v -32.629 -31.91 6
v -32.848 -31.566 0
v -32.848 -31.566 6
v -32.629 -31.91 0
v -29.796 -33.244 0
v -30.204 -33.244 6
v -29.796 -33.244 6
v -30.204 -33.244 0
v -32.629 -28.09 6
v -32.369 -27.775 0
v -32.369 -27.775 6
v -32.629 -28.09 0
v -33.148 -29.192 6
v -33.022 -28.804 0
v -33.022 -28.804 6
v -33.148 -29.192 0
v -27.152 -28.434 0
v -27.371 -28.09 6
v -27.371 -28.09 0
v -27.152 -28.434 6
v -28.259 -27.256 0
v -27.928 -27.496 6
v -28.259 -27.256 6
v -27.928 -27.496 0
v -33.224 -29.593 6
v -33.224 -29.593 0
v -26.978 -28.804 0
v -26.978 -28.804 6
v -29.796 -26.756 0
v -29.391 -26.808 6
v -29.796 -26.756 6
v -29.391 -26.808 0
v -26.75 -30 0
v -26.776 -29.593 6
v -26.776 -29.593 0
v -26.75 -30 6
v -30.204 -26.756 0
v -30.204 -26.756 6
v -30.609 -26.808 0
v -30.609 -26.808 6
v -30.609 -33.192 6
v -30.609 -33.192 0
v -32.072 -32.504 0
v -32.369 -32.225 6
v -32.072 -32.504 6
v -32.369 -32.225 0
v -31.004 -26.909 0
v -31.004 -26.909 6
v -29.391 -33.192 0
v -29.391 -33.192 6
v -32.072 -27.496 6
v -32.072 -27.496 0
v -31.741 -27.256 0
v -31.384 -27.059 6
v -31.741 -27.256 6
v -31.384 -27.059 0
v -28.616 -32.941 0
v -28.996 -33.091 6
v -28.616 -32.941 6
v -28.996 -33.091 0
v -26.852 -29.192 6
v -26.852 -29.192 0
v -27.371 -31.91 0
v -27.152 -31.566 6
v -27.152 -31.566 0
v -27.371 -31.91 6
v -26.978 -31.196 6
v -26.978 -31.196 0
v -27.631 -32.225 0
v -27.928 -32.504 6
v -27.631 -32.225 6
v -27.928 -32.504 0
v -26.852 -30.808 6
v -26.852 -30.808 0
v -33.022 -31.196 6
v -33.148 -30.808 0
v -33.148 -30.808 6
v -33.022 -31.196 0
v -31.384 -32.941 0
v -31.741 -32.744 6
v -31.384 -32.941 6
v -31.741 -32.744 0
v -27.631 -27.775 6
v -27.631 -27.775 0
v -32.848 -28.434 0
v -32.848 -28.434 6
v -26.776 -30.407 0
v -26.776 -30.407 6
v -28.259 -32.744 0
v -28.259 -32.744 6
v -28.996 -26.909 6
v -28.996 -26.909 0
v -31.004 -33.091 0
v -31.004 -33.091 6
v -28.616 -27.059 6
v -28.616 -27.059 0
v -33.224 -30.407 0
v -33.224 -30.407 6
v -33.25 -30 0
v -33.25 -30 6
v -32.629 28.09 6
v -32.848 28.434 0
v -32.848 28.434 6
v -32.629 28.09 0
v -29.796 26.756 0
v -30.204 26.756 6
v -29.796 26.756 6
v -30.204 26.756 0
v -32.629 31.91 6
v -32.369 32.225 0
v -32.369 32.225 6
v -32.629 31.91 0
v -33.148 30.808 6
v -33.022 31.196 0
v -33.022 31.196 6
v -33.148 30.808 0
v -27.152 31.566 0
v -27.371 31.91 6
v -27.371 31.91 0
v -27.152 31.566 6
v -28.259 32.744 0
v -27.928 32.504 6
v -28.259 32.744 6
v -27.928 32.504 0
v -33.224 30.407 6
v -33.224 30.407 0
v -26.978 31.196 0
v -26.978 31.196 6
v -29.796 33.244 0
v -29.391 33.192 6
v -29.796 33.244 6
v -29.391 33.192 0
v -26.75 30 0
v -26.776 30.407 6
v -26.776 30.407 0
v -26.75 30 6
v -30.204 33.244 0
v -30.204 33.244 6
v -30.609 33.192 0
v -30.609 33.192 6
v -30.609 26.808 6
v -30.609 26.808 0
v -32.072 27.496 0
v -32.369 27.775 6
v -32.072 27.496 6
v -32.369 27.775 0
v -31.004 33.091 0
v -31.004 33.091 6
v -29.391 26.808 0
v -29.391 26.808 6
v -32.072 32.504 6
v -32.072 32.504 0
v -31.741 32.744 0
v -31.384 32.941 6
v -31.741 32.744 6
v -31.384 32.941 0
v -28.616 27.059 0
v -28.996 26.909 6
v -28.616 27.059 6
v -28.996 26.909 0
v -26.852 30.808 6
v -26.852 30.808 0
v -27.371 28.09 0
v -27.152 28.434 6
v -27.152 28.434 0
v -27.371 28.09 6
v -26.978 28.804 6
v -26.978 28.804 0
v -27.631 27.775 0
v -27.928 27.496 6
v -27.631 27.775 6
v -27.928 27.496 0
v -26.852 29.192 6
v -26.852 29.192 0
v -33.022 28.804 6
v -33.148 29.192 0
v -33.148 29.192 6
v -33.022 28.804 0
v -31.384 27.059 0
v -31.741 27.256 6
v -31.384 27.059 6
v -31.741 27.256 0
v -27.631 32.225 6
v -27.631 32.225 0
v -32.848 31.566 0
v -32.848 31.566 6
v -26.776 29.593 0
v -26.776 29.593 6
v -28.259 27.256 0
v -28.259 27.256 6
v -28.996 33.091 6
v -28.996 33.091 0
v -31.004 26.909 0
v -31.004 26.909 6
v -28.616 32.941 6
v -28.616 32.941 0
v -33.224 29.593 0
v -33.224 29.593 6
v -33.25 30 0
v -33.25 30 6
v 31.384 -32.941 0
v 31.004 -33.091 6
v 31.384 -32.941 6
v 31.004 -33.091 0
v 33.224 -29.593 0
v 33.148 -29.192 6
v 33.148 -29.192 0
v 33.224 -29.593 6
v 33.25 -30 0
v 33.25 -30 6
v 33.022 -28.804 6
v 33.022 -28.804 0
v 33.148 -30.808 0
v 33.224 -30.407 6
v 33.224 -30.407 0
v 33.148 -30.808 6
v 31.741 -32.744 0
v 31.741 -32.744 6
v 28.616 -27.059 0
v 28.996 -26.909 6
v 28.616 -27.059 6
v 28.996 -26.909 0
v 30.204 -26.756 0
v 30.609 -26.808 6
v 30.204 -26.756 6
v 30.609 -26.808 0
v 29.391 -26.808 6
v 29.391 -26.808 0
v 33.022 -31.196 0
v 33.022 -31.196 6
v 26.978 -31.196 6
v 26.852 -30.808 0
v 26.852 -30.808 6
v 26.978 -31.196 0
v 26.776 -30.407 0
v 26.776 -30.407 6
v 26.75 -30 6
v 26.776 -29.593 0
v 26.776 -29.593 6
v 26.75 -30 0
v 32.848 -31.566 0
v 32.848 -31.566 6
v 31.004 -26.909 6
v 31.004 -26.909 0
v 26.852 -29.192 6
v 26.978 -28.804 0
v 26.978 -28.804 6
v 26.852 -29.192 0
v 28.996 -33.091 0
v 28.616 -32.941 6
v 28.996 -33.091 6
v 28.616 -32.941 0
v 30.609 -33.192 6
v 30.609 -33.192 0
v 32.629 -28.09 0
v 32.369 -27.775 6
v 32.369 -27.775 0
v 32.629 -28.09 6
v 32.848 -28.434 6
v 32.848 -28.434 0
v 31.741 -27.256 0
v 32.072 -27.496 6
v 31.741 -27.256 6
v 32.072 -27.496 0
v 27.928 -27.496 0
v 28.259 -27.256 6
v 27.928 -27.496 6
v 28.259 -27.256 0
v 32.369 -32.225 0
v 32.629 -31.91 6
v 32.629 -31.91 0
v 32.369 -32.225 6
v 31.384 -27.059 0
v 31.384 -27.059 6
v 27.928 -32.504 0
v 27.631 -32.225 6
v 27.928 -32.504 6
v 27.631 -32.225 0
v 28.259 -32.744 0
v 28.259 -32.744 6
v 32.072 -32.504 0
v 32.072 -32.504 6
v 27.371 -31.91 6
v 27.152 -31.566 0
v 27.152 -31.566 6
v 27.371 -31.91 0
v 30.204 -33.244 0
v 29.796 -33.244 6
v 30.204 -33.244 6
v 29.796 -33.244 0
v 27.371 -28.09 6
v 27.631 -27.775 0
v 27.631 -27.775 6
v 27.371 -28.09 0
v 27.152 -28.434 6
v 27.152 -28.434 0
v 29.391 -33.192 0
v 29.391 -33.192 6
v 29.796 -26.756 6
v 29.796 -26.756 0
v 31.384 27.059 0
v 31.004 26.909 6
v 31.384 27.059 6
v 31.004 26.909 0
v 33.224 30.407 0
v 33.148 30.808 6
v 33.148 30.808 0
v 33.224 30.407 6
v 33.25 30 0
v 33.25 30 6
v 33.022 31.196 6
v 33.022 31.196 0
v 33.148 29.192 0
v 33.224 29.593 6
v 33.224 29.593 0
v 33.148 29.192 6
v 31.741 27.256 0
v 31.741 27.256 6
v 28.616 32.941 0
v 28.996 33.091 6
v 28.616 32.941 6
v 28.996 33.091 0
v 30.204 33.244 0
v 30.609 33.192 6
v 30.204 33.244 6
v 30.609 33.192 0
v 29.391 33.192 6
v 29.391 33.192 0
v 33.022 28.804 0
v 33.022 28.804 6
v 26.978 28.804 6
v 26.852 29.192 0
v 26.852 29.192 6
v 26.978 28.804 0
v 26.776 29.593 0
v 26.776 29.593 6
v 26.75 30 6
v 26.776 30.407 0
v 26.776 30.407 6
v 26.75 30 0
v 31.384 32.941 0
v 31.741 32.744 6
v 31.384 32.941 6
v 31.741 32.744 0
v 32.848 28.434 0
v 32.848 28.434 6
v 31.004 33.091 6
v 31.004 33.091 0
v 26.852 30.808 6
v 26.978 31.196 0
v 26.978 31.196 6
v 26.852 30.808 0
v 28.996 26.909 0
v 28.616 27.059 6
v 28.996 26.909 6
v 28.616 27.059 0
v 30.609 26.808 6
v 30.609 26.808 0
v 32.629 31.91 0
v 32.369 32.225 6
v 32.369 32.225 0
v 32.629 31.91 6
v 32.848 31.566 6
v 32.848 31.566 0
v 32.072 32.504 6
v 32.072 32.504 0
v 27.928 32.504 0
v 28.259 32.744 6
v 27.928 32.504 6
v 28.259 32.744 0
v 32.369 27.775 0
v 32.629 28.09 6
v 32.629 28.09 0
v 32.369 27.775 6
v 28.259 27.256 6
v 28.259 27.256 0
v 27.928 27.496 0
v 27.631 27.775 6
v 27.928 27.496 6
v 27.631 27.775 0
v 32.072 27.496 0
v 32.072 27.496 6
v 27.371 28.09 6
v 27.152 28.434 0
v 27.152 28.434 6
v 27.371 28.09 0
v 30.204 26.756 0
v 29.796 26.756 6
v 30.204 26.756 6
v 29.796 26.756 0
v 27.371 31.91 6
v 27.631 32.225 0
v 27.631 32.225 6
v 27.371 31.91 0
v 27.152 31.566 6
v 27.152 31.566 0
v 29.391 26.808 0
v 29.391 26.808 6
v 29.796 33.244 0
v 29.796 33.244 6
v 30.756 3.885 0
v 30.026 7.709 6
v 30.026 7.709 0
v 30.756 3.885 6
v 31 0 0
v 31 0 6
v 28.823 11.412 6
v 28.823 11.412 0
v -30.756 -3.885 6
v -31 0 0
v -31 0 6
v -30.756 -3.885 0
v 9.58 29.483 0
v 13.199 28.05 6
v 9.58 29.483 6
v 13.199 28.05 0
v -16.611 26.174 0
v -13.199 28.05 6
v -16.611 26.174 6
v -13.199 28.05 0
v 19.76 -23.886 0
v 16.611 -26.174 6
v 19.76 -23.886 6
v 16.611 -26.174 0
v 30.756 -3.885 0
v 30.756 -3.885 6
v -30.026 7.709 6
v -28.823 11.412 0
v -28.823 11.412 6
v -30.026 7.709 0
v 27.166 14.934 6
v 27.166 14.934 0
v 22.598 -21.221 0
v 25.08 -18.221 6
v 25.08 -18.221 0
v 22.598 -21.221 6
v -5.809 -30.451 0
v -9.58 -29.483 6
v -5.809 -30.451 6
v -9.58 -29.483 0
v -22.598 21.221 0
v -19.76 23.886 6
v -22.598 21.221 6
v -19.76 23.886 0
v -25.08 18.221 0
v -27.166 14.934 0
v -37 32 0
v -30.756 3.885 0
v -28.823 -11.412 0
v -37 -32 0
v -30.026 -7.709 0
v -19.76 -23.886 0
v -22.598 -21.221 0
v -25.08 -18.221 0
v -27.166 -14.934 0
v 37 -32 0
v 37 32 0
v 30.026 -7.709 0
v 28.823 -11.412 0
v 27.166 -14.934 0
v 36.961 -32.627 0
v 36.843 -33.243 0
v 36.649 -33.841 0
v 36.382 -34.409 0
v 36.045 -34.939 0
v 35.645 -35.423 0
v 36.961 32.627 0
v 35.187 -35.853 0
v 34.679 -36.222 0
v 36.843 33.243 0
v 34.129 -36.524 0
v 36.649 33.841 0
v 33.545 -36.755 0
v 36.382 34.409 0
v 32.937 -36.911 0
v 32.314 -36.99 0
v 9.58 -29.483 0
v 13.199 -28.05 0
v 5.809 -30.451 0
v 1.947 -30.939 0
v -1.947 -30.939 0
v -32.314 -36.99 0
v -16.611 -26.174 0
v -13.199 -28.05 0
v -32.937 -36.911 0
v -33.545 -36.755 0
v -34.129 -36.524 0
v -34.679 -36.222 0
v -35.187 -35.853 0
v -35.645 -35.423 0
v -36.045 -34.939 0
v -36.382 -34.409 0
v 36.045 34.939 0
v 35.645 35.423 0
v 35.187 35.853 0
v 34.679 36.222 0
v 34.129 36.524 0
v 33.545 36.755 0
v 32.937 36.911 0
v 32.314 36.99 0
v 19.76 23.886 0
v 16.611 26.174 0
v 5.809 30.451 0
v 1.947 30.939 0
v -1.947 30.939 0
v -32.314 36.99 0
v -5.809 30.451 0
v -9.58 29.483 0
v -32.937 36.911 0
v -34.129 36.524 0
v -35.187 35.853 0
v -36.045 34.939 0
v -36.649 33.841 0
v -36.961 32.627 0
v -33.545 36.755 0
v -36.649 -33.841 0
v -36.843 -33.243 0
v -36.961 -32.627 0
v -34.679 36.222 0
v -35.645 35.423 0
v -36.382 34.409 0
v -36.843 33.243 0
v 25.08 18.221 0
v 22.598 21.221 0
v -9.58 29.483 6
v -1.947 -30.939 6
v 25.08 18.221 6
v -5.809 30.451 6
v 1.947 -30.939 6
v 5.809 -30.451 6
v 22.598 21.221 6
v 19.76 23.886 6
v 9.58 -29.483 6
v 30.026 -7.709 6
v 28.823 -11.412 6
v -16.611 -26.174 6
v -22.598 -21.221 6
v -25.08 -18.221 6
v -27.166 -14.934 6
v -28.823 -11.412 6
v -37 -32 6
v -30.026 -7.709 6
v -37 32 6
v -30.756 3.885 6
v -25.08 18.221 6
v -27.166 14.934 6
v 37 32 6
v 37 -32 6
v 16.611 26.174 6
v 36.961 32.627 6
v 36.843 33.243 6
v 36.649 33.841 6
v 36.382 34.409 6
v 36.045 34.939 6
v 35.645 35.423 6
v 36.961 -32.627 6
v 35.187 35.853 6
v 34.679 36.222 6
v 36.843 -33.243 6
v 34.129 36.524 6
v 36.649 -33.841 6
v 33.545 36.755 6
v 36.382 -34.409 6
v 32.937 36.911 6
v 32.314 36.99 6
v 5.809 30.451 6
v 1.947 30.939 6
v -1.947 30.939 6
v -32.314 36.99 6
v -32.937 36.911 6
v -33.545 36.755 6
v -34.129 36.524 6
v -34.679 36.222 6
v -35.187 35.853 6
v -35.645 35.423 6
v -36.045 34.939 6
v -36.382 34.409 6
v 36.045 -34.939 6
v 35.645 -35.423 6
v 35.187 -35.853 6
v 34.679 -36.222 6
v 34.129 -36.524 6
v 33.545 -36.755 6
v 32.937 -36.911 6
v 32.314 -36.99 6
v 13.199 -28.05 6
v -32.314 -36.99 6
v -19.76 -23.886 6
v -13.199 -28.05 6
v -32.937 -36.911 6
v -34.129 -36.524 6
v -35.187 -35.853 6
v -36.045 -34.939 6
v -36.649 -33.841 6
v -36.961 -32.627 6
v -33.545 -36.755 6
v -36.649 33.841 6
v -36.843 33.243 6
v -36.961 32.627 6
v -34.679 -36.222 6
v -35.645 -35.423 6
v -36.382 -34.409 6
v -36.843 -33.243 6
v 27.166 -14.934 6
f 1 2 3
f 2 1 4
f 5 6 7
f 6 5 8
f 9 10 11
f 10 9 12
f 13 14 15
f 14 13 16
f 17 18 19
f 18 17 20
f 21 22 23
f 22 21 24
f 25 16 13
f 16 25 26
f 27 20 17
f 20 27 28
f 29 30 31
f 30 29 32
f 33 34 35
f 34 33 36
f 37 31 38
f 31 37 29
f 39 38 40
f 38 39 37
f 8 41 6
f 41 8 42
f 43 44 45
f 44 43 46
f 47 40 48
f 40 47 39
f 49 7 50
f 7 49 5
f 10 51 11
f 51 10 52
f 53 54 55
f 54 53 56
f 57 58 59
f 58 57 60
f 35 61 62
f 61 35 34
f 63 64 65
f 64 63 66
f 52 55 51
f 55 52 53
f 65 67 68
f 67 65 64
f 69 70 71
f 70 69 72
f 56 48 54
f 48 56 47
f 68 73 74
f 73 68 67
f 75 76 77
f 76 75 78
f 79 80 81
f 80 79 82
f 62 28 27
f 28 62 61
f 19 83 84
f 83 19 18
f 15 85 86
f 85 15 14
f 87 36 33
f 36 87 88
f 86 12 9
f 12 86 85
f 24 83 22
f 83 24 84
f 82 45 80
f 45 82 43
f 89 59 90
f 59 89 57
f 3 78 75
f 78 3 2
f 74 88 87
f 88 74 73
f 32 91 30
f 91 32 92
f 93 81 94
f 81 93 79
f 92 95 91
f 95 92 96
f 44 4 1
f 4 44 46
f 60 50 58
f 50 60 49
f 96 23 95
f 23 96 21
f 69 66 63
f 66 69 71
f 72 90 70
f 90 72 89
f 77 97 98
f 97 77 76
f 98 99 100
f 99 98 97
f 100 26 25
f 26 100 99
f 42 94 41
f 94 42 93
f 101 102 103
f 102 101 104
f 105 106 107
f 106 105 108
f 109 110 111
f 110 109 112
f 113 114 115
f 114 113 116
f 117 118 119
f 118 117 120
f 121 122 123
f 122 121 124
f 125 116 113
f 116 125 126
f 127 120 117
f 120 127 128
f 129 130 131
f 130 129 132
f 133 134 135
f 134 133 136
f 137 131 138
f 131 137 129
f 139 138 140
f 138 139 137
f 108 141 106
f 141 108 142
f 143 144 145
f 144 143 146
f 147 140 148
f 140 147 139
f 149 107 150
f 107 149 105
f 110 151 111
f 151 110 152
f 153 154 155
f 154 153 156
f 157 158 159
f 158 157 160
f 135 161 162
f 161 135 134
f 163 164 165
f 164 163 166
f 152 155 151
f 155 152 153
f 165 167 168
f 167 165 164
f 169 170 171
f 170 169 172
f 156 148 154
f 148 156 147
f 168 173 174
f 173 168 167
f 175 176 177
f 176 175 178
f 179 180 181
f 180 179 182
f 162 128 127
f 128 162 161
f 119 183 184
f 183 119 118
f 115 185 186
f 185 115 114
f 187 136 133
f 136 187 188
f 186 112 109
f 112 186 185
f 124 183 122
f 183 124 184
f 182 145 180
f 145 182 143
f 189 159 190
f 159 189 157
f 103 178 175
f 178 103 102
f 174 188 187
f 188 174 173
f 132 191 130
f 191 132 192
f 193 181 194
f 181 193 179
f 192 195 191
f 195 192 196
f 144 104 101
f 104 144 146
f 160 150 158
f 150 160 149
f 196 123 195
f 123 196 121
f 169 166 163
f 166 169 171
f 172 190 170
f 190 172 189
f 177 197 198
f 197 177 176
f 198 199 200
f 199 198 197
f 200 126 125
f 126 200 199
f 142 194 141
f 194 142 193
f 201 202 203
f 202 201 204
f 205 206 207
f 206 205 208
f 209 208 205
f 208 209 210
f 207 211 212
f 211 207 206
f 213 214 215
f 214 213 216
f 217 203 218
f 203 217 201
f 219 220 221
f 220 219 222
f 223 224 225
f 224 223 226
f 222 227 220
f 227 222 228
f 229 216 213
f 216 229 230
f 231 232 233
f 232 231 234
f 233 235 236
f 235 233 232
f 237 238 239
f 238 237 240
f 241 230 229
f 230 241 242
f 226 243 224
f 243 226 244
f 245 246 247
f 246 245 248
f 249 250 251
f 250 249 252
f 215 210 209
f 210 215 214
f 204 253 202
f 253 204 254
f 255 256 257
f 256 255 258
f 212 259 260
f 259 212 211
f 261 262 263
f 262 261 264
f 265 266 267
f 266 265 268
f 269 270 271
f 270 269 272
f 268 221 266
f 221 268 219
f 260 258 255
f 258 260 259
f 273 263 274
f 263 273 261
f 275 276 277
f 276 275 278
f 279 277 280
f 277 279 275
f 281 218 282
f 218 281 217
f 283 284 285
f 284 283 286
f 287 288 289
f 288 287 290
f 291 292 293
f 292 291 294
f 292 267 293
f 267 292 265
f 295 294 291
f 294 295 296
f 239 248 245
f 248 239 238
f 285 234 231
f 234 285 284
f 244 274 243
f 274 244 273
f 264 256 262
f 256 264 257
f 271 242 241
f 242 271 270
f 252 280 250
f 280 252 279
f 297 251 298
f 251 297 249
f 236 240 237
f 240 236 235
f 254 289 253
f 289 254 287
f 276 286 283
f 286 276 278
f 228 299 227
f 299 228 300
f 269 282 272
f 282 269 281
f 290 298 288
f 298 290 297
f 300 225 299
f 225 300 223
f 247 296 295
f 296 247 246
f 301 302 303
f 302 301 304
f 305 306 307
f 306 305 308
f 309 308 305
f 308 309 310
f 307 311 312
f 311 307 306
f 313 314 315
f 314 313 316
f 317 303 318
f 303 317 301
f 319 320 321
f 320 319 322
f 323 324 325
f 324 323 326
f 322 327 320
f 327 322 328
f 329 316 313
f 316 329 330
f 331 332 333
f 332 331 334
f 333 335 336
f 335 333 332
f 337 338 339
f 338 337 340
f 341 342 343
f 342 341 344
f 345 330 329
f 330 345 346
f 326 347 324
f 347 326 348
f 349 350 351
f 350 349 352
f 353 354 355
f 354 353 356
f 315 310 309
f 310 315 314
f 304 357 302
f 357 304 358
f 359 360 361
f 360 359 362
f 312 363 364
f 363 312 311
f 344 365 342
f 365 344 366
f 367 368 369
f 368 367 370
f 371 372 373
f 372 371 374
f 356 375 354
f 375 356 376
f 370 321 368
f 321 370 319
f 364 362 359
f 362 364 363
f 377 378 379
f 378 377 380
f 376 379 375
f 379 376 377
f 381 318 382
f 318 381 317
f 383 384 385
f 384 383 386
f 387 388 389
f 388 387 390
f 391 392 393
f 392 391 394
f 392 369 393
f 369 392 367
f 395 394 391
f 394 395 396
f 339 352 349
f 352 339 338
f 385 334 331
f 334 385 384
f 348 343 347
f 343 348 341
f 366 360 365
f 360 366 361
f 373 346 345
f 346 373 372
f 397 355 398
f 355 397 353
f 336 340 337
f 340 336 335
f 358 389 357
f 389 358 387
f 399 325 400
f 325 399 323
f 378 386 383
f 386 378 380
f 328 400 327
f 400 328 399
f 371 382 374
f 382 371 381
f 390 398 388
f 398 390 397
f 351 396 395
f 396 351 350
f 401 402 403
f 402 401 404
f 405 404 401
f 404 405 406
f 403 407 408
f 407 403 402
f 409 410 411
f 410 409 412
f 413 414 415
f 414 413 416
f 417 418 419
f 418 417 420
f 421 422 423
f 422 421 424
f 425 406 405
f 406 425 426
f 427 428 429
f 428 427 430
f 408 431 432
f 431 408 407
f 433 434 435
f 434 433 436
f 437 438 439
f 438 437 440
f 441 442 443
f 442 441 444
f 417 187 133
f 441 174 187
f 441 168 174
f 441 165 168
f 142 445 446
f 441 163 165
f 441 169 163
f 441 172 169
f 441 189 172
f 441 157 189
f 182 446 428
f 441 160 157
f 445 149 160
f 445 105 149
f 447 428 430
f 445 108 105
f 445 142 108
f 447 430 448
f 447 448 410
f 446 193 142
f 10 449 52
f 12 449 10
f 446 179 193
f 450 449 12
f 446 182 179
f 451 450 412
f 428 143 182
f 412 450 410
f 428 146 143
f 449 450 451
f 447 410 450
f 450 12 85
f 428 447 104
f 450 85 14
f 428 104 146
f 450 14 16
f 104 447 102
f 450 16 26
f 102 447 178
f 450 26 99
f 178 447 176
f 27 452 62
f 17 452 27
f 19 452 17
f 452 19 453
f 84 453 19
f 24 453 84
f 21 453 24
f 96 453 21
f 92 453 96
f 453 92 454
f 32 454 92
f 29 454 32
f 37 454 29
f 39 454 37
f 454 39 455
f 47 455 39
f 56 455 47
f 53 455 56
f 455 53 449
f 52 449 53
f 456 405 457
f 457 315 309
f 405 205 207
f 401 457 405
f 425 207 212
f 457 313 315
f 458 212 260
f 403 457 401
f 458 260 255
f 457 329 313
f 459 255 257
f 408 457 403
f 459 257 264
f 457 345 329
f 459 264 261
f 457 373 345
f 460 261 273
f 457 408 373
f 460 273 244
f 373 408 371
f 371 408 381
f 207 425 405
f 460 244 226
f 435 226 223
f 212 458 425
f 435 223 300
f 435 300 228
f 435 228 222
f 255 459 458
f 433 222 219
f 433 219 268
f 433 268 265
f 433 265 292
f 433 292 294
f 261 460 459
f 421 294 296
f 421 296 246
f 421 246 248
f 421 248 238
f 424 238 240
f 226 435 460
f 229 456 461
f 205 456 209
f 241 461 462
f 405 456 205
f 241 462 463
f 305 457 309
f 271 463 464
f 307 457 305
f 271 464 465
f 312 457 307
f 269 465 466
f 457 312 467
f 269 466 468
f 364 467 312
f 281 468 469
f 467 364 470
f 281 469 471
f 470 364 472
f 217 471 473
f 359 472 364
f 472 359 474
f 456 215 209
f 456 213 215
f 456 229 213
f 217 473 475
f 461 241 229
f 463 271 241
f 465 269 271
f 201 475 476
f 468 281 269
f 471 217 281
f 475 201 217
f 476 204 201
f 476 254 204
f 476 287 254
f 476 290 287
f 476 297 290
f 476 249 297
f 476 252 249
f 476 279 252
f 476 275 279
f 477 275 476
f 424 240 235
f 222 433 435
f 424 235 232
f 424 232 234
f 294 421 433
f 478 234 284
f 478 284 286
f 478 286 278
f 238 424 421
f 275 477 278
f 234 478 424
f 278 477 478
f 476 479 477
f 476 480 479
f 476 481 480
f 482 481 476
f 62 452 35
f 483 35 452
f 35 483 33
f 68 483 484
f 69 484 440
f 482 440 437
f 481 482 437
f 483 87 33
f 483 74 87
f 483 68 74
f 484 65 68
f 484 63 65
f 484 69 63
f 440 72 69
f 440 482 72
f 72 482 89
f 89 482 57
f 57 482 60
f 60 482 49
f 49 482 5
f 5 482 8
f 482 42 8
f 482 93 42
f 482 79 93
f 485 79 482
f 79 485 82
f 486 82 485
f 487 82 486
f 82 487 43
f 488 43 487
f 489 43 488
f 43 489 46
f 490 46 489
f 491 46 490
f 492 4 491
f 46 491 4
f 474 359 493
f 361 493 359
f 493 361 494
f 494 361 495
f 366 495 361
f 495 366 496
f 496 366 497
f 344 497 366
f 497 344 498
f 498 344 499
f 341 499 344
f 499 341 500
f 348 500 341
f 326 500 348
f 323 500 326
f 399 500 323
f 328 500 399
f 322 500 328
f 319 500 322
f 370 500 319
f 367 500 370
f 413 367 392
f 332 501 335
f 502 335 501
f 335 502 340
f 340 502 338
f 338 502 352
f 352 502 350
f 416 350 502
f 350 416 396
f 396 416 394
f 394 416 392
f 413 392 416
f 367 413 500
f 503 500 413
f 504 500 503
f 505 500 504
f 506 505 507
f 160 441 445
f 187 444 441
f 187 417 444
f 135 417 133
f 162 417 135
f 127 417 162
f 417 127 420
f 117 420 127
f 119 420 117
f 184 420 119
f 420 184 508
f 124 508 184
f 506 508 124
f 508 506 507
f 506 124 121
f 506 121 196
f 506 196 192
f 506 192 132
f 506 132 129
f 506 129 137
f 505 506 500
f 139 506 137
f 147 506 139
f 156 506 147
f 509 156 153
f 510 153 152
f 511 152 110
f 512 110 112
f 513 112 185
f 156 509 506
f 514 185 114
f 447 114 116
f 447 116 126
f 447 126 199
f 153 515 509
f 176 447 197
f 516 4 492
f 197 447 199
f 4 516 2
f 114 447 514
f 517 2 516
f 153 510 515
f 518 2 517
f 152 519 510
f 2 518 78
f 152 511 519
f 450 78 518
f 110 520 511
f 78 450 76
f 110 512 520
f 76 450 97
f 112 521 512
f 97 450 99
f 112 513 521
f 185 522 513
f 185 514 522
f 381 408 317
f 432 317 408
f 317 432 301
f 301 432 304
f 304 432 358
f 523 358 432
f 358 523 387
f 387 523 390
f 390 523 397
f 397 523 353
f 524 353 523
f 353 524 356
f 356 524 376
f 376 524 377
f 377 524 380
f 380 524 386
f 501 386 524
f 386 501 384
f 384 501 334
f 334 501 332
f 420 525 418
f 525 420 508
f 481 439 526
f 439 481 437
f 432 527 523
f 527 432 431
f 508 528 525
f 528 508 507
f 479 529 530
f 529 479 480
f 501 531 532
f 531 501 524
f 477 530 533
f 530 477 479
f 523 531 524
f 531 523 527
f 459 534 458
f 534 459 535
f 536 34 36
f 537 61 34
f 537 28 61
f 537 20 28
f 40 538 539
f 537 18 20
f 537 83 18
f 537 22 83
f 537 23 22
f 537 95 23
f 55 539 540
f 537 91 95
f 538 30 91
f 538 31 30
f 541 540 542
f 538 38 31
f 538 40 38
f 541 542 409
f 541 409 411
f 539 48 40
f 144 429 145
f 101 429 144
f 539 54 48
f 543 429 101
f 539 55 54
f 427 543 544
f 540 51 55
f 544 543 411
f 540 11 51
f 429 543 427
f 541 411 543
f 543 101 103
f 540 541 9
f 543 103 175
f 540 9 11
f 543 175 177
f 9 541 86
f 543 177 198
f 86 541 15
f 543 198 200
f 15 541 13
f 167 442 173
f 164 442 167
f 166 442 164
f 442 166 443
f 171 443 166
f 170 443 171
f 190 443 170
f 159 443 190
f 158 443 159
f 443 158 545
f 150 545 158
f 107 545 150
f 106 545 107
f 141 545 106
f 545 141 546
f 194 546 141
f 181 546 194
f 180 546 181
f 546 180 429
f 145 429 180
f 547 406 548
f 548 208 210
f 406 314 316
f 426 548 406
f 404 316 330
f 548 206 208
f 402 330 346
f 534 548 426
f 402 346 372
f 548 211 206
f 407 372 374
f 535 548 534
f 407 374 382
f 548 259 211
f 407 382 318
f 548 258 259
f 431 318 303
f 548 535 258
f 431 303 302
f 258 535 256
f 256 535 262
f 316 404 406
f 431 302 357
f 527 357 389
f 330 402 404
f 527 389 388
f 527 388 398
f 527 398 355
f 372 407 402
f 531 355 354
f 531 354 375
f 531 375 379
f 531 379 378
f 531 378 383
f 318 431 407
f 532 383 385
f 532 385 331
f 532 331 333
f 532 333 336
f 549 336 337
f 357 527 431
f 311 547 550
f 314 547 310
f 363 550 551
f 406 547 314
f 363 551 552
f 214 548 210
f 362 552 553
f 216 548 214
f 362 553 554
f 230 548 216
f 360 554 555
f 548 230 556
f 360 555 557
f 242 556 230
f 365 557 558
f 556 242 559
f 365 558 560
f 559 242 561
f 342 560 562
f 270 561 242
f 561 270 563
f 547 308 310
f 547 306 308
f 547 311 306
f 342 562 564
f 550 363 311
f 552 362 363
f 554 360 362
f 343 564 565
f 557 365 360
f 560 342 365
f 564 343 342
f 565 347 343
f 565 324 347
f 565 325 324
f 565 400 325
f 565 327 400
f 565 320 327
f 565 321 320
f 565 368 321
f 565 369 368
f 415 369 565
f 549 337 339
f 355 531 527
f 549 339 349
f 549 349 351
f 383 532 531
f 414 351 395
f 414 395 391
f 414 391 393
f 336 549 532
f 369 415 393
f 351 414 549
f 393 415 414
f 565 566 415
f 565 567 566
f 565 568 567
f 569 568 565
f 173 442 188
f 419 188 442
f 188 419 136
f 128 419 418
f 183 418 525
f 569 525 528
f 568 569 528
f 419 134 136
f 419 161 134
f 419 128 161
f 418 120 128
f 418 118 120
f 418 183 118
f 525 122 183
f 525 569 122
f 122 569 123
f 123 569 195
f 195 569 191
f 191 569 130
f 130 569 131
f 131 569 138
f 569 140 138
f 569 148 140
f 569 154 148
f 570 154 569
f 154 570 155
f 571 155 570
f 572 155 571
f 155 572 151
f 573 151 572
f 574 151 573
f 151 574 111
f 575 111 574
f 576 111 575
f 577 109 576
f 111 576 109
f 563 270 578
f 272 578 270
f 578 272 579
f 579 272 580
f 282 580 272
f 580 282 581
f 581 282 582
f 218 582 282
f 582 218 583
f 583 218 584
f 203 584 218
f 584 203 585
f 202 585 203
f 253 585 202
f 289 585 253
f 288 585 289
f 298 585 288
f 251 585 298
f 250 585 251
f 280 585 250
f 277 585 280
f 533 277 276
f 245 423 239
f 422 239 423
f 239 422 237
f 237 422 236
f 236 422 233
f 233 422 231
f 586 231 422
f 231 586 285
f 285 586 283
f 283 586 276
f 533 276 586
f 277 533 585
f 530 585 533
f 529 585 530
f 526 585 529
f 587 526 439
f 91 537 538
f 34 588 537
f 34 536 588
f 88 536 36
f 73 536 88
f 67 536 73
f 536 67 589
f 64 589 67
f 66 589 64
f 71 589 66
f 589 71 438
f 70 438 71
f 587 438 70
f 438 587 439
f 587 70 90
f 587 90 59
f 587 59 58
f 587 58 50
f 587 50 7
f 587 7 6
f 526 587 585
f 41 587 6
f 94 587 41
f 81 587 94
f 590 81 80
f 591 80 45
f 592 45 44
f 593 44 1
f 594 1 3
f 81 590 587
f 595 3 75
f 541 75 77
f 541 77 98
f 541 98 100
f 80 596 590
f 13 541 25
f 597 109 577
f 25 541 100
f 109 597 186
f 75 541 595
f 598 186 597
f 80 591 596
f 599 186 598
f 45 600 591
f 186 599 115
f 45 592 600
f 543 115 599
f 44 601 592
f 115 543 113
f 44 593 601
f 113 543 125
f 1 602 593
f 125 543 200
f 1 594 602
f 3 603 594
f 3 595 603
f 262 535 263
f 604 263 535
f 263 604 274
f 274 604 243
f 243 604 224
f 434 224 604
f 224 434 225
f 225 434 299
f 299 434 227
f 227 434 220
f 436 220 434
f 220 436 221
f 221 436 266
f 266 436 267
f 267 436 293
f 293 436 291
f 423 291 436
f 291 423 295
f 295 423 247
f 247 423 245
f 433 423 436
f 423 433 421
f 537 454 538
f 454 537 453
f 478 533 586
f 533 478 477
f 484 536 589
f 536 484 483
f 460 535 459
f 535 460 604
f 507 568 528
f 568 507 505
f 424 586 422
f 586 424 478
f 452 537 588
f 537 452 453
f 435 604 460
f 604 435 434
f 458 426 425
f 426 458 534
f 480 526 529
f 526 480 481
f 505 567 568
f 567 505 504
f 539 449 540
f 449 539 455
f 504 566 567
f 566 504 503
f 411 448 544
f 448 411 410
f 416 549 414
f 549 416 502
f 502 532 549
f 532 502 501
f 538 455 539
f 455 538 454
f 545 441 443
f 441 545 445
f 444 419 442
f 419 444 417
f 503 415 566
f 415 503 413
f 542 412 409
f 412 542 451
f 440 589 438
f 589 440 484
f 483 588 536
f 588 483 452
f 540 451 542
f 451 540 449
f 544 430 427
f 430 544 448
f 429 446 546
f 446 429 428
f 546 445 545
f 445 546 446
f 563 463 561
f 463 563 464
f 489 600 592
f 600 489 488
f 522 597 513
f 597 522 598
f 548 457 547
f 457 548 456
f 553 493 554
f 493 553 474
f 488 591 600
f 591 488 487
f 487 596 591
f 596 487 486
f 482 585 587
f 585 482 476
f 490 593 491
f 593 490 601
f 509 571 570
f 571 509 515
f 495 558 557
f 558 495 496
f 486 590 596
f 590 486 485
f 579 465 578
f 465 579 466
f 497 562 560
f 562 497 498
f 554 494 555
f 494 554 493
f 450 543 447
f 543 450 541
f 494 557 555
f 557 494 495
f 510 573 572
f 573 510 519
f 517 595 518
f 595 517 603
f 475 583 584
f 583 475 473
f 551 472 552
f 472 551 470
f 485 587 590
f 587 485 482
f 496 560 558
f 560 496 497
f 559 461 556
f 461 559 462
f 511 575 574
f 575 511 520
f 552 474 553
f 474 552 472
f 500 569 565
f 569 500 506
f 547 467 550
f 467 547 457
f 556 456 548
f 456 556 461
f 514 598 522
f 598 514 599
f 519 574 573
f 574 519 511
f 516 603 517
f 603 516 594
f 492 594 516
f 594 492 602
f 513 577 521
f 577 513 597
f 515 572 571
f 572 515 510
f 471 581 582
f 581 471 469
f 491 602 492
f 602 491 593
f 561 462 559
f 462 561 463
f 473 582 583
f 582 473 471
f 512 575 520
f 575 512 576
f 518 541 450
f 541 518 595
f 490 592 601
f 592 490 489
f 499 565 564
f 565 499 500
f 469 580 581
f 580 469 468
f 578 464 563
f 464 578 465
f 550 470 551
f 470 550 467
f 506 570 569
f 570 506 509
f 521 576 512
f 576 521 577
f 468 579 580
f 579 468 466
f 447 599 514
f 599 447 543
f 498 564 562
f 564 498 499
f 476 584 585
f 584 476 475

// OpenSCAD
$fn = 50;


difference() {
	union() {
		hull() {
			translate(v = [-32.0000000000, 32.0000000000, 0]) {
				cylinder(h = 6, r = 5);
			}
			translate(v = [32.0000000000, 32.0000000000, 0]) {
				cylinder(h = 6, r = 5);
			}
			translate(v = [-32.0000000000, -32.0000000000, 0]) {
				cylinder(h = 6, r = 5);
			}
			translate(v = [32.0000000000, -32.0000000000, 0]) {
				cylinder(h = 6, r = 5);
			}
		}
	}
	union() {
		#translate(v = [-30.0000000000, -30.0000000000, -100.0000000000]) {
			cylinder(h = 200, r = 3.2500000000);
		}
		#translate(v = [-30.0000000000, 30.0000000000, -100.0000000000]) {
			cylinder(h = 200, r = 3.2500000000);
		}
		#translate(v = [30.0000000000, -30.0000000000, -100.0000000000]) {
			cylinder(h = 200, r = 3.2500000000);
		}
		#translate(v = [30.0000000000, 30.0000000000, -100.0000000000]) {
			cylinder(h = 200, r = 3.2500000000);
		}
		#cylinder(h = 6, r = 31.0000000000);
	}
}
